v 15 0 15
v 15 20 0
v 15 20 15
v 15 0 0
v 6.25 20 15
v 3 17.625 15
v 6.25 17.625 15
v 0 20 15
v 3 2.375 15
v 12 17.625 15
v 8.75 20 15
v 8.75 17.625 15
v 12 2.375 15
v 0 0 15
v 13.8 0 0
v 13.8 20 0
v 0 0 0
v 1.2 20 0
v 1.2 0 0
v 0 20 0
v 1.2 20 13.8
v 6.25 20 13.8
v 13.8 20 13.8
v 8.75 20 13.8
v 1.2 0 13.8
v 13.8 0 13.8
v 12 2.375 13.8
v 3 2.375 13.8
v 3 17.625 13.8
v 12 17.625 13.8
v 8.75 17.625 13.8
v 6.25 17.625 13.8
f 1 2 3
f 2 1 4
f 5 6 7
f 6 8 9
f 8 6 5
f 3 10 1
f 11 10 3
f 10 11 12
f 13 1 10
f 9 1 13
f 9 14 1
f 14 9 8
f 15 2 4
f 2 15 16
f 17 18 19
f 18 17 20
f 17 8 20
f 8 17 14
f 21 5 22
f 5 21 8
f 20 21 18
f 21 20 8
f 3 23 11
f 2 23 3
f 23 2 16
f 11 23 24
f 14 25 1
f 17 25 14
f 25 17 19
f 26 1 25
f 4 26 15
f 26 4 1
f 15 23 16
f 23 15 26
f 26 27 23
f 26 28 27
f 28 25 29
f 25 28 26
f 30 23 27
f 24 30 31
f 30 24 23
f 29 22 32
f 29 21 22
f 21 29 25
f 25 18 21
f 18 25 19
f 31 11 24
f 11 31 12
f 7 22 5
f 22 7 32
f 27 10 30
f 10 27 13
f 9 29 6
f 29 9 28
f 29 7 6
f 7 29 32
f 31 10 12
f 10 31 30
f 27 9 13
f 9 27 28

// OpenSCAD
lw=0.4;
wt=lw*3;


difference() {
  cube([15,20,15]);
  translate([wt,-1,-wt]) cube([15-wt*2,22,15]);
  translate([15/2-2.5/2,10,0]) cube([2.5,20,20]);
  translate([15/2-9/2,20/2-15.25/2,0]) cube([9,15.25,20]);
}
